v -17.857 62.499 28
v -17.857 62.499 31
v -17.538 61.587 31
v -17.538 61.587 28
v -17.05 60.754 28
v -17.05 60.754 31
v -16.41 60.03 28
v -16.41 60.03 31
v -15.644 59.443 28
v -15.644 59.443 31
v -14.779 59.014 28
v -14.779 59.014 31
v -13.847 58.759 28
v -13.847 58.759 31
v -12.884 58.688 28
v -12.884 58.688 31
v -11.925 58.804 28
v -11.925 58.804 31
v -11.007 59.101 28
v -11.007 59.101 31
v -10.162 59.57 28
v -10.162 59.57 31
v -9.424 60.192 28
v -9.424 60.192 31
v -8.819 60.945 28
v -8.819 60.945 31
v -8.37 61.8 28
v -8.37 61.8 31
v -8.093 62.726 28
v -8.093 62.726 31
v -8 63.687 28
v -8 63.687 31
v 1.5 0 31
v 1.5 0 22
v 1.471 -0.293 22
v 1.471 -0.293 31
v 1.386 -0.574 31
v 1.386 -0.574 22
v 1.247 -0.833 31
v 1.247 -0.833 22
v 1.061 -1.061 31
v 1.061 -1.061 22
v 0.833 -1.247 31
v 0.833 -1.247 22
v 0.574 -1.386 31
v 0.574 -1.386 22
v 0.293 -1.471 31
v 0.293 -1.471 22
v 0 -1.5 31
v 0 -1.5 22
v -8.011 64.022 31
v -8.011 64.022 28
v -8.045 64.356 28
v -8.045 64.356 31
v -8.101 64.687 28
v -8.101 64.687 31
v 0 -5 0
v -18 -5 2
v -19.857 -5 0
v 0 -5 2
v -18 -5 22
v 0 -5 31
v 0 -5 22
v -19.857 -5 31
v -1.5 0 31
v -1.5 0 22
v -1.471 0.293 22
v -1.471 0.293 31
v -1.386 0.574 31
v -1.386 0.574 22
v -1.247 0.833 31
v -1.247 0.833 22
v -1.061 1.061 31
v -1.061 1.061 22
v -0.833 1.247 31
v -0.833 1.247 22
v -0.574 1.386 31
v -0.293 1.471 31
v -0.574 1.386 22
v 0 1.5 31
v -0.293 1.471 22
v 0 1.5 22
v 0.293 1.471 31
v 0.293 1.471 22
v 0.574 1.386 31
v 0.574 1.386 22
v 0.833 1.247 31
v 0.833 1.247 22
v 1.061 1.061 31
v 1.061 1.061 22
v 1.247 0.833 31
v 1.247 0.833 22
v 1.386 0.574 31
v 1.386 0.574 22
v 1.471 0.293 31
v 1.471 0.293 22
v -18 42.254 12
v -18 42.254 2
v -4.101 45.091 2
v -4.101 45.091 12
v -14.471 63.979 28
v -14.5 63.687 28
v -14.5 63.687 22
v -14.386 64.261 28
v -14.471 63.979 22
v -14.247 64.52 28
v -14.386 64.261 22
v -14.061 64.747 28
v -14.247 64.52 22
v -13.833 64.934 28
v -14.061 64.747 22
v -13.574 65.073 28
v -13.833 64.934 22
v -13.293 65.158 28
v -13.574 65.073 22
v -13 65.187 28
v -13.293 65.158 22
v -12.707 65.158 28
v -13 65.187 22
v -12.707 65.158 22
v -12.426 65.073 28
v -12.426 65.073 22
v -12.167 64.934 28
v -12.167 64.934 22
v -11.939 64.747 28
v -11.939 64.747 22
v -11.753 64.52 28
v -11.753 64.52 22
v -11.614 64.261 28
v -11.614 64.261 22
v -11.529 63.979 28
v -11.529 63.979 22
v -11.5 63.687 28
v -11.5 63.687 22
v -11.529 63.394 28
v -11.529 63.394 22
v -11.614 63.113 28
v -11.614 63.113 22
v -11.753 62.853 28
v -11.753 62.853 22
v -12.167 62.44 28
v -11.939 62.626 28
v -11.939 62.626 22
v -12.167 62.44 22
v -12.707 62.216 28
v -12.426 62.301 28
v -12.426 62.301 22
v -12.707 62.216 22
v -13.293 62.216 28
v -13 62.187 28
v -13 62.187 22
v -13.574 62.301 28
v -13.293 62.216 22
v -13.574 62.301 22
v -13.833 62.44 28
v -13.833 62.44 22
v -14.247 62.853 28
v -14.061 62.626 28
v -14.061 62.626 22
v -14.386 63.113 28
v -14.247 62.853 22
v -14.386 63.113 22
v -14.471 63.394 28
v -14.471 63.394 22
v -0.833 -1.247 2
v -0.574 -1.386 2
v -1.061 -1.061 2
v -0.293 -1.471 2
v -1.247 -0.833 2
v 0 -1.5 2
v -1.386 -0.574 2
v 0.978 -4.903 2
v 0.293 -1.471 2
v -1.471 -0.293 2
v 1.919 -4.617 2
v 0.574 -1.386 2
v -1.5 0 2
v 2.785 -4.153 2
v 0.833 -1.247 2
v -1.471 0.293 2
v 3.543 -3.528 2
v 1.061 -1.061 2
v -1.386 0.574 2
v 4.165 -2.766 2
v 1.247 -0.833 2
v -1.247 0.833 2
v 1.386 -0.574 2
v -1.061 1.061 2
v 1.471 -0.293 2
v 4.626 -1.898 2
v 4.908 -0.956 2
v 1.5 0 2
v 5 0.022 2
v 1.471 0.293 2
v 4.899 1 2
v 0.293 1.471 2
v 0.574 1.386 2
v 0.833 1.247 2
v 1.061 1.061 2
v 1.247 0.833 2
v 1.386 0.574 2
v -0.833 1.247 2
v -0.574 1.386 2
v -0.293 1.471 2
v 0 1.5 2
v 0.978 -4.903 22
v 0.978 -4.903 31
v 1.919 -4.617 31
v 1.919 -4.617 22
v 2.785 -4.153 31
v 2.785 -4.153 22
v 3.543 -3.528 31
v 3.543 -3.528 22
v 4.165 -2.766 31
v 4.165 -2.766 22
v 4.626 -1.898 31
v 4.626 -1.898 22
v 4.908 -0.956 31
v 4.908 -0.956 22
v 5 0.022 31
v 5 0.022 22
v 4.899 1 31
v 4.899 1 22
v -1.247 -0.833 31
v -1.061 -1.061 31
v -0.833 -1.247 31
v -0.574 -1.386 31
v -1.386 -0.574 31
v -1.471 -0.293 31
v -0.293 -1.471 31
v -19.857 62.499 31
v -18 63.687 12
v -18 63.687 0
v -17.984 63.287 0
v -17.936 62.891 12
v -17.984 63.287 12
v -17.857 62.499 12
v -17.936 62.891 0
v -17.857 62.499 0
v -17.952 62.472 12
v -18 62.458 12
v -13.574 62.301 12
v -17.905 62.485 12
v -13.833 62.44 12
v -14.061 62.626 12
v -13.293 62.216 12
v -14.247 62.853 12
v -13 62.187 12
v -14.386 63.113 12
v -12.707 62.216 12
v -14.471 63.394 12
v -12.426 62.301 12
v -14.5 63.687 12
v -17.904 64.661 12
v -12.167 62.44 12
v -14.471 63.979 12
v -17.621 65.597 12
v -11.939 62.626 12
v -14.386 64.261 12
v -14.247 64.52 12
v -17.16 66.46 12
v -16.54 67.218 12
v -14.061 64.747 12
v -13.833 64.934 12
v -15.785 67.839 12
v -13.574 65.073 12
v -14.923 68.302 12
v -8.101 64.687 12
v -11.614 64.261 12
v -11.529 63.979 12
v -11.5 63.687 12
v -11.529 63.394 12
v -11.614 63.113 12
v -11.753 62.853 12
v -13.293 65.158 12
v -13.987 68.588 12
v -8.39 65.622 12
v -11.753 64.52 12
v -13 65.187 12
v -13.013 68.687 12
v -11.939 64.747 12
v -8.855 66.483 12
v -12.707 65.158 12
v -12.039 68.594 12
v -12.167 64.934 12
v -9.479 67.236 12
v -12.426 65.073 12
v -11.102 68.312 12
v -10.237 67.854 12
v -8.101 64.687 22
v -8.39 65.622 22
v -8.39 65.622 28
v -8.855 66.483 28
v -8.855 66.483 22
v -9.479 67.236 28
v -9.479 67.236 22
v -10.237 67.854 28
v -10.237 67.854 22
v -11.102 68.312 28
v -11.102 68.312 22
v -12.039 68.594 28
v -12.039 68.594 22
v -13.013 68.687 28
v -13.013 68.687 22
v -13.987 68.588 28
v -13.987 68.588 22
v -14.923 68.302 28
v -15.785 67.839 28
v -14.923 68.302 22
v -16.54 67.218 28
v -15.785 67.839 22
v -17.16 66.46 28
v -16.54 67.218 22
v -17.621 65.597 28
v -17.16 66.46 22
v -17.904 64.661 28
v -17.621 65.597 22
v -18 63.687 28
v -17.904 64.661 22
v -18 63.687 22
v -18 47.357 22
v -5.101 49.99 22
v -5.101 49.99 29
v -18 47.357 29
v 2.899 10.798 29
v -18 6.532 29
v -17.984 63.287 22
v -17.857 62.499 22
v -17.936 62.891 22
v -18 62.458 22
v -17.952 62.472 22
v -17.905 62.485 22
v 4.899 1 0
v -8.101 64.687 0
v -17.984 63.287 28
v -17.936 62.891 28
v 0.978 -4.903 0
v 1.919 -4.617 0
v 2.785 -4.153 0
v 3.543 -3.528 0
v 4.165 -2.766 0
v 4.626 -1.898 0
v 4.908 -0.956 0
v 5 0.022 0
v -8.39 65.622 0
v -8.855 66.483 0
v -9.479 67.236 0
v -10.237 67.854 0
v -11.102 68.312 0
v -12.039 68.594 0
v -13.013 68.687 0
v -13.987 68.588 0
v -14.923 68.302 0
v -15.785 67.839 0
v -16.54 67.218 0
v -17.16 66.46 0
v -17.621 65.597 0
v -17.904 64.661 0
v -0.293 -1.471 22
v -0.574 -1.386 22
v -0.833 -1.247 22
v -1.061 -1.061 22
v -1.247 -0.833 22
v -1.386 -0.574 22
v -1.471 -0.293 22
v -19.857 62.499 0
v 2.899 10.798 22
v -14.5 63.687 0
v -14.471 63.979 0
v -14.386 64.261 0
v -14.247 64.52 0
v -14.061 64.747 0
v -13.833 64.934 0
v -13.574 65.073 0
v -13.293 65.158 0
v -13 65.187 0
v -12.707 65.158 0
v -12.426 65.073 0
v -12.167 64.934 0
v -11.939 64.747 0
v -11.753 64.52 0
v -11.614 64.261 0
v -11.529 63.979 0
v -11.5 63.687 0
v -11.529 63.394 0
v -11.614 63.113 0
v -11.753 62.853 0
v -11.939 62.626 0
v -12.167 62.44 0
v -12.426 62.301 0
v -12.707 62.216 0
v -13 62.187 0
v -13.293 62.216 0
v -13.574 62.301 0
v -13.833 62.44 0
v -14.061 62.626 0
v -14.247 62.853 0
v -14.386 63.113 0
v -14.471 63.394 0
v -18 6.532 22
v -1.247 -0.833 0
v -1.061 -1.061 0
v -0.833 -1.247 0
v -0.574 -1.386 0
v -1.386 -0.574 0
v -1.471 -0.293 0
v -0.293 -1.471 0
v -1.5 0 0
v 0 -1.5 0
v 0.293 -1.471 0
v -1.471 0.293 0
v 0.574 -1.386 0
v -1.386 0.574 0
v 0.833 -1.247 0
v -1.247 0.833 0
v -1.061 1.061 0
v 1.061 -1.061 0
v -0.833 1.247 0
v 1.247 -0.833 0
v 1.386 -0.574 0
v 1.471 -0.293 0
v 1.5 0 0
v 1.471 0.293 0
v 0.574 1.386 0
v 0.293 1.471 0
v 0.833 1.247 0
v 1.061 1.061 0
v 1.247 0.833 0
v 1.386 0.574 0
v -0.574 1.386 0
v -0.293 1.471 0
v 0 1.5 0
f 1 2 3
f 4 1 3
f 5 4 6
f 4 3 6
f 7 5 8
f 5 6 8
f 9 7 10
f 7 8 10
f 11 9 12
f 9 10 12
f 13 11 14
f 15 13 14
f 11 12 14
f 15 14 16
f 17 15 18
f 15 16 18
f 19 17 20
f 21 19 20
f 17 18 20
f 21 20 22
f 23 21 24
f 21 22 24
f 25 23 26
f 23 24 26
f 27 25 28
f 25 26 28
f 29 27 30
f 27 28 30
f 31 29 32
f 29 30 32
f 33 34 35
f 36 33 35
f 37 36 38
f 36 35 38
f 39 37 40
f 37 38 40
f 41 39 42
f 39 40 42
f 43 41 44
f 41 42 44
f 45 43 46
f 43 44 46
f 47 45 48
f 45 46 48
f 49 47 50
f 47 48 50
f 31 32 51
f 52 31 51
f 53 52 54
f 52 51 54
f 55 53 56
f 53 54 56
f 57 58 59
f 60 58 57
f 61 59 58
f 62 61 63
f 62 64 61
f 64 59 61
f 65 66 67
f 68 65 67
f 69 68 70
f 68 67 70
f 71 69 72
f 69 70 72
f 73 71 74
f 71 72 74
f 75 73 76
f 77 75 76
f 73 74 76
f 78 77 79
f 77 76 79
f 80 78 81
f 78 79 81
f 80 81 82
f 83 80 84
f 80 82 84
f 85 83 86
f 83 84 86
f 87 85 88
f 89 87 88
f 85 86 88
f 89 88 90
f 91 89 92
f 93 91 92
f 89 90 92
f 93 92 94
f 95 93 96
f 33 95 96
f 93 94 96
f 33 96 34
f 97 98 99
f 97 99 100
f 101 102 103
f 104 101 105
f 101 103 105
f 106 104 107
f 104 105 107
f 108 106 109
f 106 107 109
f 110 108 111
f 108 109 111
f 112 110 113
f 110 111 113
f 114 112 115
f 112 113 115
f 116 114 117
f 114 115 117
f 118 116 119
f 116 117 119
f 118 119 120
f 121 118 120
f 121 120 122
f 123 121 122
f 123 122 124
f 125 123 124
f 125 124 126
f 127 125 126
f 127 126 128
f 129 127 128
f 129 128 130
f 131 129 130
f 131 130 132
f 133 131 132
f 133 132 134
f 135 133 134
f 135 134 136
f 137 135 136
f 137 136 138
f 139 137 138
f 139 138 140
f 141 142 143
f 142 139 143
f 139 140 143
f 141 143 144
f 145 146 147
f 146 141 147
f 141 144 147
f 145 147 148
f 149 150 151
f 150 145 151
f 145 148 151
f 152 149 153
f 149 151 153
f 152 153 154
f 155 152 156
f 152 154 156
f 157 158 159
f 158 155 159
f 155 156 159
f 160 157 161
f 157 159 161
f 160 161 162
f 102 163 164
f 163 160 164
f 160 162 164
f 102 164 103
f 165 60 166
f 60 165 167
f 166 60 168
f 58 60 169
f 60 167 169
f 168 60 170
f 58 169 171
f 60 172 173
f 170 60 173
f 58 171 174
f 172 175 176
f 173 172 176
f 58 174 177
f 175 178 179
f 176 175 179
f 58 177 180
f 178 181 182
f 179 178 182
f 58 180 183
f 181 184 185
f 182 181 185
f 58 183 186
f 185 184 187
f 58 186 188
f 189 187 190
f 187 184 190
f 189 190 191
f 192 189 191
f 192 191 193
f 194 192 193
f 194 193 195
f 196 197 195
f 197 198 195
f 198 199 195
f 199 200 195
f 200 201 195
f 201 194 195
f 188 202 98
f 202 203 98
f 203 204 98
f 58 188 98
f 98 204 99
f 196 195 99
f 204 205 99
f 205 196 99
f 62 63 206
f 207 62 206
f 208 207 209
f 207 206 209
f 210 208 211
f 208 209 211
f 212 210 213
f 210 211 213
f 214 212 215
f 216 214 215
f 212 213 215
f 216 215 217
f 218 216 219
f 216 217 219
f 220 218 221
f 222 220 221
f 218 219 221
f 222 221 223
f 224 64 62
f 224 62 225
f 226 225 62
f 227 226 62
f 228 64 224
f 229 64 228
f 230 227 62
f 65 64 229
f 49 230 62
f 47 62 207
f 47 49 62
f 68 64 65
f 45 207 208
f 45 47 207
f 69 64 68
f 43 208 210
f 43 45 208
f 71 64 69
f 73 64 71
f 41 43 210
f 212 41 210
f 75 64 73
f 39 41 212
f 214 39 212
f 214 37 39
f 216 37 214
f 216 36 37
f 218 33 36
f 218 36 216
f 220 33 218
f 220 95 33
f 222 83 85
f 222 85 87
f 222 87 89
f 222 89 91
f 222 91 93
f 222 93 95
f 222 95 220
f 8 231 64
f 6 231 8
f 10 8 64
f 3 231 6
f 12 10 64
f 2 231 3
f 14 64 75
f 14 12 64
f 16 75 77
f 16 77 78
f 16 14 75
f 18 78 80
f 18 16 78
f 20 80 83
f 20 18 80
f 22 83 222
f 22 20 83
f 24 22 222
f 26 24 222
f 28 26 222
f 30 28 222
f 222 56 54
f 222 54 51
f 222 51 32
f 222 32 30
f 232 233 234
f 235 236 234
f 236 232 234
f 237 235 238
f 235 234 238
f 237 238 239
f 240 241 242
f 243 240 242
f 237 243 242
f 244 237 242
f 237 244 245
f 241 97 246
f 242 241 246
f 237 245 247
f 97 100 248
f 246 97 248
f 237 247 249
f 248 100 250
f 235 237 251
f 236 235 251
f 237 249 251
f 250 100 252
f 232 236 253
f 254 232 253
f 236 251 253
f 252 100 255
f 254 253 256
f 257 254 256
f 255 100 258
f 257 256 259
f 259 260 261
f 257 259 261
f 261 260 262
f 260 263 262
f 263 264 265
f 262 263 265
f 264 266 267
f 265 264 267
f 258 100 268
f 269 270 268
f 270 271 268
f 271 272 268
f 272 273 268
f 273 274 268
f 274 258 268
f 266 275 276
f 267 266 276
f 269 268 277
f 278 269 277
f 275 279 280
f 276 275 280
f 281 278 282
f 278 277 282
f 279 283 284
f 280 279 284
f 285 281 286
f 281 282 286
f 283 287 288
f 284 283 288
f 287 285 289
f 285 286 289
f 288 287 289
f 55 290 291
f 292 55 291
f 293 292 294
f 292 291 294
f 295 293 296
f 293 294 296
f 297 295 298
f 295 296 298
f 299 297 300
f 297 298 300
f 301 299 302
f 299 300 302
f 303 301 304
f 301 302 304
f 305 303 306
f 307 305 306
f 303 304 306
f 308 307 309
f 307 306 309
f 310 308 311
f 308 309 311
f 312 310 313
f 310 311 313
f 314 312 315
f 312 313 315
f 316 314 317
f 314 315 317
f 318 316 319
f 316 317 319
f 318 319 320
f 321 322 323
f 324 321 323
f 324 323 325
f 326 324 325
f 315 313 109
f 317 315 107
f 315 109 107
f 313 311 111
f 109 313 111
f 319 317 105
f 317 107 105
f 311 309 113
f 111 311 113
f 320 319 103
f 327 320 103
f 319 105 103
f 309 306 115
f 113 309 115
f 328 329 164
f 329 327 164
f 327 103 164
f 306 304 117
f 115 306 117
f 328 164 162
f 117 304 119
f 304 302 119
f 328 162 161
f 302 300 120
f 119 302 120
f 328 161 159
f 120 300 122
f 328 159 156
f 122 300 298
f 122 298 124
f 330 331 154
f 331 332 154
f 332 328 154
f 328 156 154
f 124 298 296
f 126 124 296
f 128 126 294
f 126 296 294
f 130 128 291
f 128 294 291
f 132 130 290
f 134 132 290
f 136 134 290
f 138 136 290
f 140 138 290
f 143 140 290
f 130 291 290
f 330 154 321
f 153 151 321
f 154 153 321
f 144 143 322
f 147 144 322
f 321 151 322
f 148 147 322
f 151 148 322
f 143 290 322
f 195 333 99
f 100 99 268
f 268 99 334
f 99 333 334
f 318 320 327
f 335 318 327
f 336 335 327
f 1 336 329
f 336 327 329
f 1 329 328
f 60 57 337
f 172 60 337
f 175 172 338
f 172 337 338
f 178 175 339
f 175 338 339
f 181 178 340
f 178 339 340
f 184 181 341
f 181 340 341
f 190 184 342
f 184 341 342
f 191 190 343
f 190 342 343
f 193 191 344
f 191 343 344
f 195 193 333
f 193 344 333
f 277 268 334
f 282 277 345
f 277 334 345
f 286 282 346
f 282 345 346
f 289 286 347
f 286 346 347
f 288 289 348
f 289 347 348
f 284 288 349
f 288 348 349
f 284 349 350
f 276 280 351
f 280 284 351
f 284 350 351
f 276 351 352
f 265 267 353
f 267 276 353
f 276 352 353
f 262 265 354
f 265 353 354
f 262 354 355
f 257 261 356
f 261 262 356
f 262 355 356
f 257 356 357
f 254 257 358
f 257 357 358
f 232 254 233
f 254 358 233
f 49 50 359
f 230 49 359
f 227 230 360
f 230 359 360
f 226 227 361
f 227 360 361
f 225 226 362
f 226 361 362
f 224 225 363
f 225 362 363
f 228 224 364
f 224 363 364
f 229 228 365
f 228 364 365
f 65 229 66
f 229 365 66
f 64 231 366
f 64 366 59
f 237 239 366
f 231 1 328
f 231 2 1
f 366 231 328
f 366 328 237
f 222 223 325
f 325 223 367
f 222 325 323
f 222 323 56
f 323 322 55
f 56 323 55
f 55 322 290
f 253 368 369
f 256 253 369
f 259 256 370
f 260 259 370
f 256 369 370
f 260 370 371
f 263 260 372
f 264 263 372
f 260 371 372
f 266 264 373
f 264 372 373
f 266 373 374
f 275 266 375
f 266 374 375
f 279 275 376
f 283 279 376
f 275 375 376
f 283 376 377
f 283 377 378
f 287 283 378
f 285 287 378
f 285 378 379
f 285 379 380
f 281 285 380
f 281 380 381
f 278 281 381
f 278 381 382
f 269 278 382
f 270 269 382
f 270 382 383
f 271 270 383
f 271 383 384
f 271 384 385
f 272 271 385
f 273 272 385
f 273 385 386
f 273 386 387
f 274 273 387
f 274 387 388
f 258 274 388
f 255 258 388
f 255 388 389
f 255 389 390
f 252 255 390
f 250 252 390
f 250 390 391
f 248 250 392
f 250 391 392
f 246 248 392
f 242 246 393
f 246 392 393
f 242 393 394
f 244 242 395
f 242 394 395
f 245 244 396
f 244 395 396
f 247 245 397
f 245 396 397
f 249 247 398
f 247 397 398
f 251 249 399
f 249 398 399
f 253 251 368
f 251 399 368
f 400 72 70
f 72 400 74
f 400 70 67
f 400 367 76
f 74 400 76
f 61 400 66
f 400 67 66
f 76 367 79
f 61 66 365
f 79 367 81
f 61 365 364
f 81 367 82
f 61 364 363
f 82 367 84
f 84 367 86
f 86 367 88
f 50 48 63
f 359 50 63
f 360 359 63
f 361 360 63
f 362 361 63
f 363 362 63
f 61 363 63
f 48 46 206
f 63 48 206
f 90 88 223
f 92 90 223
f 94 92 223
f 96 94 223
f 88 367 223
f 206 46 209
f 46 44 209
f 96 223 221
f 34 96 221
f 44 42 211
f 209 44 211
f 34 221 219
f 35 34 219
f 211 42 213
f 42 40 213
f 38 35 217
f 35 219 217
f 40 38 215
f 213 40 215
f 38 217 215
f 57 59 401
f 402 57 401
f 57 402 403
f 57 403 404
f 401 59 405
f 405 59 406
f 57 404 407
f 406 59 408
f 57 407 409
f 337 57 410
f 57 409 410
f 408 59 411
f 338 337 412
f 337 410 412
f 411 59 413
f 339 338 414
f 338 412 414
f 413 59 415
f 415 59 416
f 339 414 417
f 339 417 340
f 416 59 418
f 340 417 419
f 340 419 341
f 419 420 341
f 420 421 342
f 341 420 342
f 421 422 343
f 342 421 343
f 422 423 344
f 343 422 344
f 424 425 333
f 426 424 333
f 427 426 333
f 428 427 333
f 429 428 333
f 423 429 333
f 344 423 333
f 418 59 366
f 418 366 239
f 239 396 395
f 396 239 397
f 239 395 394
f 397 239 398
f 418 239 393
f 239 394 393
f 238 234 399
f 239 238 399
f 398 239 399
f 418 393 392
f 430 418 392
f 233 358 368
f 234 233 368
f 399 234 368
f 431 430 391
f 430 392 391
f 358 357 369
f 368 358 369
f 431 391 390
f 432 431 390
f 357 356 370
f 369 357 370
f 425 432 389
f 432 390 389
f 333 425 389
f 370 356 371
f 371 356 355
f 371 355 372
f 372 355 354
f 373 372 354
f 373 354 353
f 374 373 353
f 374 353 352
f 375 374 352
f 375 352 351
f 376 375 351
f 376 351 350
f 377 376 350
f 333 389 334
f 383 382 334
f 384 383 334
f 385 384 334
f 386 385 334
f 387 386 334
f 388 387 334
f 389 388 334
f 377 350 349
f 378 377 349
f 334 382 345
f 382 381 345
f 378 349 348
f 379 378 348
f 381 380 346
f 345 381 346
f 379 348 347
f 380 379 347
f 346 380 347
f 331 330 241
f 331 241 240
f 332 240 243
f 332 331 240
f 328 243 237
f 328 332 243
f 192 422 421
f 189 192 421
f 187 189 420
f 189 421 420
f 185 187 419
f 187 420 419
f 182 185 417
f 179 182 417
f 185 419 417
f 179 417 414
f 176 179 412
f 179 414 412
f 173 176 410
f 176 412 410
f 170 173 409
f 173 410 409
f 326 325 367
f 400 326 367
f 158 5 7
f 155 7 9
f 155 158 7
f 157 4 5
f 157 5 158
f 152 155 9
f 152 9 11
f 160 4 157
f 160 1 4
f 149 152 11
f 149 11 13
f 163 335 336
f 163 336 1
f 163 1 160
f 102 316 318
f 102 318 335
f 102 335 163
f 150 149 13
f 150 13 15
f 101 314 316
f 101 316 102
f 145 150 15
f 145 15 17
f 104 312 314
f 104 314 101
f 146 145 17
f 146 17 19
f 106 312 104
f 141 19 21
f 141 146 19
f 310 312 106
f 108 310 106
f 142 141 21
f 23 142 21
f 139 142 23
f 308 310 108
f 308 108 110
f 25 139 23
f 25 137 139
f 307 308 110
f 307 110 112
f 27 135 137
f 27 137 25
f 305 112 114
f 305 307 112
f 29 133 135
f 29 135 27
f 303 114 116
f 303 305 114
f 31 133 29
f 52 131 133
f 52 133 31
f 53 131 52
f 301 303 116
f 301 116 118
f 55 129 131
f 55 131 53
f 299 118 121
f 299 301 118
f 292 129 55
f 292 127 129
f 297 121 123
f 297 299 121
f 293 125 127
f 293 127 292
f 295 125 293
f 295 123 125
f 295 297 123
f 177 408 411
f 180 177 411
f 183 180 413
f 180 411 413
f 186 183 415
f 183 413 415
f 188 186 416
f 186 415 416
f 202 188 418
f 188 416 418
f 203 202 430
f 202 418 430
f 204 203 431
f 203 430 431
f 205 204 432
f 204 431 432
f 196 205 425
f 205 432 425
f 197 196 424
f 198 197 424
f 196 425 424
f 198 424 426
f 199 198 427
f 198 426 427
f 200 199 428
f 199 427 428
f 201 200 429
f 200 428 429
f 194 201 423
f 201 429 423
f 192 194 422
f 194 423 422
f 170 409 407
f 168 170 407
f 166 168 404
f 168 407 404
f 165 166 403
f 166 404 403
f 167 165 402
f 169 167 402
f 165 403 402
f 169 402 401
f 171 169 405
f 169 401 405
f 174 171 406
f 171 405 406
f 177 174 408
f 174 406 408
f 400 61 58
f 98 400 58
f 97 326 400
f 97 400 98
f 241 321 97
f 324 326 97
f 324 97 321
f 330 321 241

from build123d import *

# Parameters (mm, degrees)
F1_DEPTH = 31
F2_W     = 5
F2_H     = 10
F2_H_2   = 20
F3_DEPTH = 25
F5_DEPTH = 31
F6_R     = 1.5
F7_DEPTH = 3


with BuildPart() as f1:
    # F0 (on Top) → F1 (new body)
    with BuildSketch(Plane.XY):
        with BuildLine():
            Line((-18, -5), (0, -5))
            ThreePointArc((0, -5), (3.8729833462, -3.1622776602), (4.8989794856, 1))
            Line((4.8989794856, 1), (-8.1010205144, 64.6867333124))
            ThreePointArc((-8.1010205144, 64.6867333124), (-13.50254481, 68.6614140774), (-18, 63.6867333124))
            ThreePointArc((-18, 63.6867333124), (-17.9640943536, 63.0885968324), (-17.8568931005, 62.4990509432))
            ThreePointArc((-17.8568931005, 62.4990509432), (-17.9284583077, 62.4785593841), (-18, 62.4579858785))
            Line((-18, 62.4579858785), (-18, -5))
        make_face()
        with BuildLine():
            ThreePointArc((-1.5, 0), (0, 1.5), (1.5, 0))
            ThreePointArc((1.5, 0), (1.0606601718, -1.0606601718), (0, -1.5))
            ThreePointArc((0, -1.5), (-1.0606601718, -1.0606601718), (-1.5, 0))
        make_face(mode=Mode.SUBTRACT)
        with BuildLine():
            ThreePointArc((-11.5, 63.6867333124), (-13, 62.1867333124), (-14.5, 63.6867333124))
            ThreePointArc((-14.5, 63.6867333124), (-13, 65.1867333124), (-11.5, 63.6867333124))
        make_face(mode=Mode.SUBTRACT)
    extrude(amount=F1_DEPTH)

    # F2 (on face) → F3 (cut)
    with BuildSketch(Plane(origin=(4.8989794856, 1, 0), x_dir=(-0.2, 0.9797958971, 0), z_dir=(0.9797958971, 0.2, 0))):
        Polygon((0, 22), (0, 2), (45, 2), (45, 12), (65, 12), (65, 22), (50, 22), (50, 29), (10, 29), (10, 22), align=None)
        with Locations((67.5, 17)):
            Rectangle(F2_W, F2_H)
        with Locations((-2.5, 12)):
            Rectangle(F2_W, F2_H_2)
    extrude(amount=-F3_DEPTH, mode=Mode.SUBTRACT)

    # F4 (on face) → F5 (join)
    with BuildSketch(Plane.XY.offset(31)):
        with BuildLine():
            ThreePointArc((-18, 62.4579858785), (-17.9284583077, 62.4785593841), (-17.8568931005, 62.4990509432))
            Line((-17.8568931005, 62.4990509432), (-19.8568931005, 62.4990509432))
            Line((-19.8568931005, 62.4990509432), (-19.8568931005, -5))
            Line((-19.8568931005, -5), (-18, -5))
            Line((-18, -5), (-18, 62.4579858785))
        make_face()
    extrude(amount=-F5_DEPTH)

    # F6 (on face) → F7 (cut)
    with BuildSketch(Plane.XY.offset(31)):
        with BuildLine():
            ThreePointArc((-8, 63.6867333124), (-8.025319235, 64.1892781224), (-8.1010205144, 64.6867333124))
            ThreePointArc((-8.1010205144, 64.6867333124), (-14.0940435791, 68.5655721749), (-17.8568931005, 62.4990509432))
            ThreePointArc((-17.8568931005, 62.4990509432), (-12.40186352, 58.7226389588), (-8, 63.6867333124))
        make_face()
        with Locations((-13, 63.6867333124)):
            Circle(F6_R, mode=Mode.SUBTRACT)
    extrude(amount=-F7_DEPTH, mode=Mode.SUBTRACT)


solid = f1.part
